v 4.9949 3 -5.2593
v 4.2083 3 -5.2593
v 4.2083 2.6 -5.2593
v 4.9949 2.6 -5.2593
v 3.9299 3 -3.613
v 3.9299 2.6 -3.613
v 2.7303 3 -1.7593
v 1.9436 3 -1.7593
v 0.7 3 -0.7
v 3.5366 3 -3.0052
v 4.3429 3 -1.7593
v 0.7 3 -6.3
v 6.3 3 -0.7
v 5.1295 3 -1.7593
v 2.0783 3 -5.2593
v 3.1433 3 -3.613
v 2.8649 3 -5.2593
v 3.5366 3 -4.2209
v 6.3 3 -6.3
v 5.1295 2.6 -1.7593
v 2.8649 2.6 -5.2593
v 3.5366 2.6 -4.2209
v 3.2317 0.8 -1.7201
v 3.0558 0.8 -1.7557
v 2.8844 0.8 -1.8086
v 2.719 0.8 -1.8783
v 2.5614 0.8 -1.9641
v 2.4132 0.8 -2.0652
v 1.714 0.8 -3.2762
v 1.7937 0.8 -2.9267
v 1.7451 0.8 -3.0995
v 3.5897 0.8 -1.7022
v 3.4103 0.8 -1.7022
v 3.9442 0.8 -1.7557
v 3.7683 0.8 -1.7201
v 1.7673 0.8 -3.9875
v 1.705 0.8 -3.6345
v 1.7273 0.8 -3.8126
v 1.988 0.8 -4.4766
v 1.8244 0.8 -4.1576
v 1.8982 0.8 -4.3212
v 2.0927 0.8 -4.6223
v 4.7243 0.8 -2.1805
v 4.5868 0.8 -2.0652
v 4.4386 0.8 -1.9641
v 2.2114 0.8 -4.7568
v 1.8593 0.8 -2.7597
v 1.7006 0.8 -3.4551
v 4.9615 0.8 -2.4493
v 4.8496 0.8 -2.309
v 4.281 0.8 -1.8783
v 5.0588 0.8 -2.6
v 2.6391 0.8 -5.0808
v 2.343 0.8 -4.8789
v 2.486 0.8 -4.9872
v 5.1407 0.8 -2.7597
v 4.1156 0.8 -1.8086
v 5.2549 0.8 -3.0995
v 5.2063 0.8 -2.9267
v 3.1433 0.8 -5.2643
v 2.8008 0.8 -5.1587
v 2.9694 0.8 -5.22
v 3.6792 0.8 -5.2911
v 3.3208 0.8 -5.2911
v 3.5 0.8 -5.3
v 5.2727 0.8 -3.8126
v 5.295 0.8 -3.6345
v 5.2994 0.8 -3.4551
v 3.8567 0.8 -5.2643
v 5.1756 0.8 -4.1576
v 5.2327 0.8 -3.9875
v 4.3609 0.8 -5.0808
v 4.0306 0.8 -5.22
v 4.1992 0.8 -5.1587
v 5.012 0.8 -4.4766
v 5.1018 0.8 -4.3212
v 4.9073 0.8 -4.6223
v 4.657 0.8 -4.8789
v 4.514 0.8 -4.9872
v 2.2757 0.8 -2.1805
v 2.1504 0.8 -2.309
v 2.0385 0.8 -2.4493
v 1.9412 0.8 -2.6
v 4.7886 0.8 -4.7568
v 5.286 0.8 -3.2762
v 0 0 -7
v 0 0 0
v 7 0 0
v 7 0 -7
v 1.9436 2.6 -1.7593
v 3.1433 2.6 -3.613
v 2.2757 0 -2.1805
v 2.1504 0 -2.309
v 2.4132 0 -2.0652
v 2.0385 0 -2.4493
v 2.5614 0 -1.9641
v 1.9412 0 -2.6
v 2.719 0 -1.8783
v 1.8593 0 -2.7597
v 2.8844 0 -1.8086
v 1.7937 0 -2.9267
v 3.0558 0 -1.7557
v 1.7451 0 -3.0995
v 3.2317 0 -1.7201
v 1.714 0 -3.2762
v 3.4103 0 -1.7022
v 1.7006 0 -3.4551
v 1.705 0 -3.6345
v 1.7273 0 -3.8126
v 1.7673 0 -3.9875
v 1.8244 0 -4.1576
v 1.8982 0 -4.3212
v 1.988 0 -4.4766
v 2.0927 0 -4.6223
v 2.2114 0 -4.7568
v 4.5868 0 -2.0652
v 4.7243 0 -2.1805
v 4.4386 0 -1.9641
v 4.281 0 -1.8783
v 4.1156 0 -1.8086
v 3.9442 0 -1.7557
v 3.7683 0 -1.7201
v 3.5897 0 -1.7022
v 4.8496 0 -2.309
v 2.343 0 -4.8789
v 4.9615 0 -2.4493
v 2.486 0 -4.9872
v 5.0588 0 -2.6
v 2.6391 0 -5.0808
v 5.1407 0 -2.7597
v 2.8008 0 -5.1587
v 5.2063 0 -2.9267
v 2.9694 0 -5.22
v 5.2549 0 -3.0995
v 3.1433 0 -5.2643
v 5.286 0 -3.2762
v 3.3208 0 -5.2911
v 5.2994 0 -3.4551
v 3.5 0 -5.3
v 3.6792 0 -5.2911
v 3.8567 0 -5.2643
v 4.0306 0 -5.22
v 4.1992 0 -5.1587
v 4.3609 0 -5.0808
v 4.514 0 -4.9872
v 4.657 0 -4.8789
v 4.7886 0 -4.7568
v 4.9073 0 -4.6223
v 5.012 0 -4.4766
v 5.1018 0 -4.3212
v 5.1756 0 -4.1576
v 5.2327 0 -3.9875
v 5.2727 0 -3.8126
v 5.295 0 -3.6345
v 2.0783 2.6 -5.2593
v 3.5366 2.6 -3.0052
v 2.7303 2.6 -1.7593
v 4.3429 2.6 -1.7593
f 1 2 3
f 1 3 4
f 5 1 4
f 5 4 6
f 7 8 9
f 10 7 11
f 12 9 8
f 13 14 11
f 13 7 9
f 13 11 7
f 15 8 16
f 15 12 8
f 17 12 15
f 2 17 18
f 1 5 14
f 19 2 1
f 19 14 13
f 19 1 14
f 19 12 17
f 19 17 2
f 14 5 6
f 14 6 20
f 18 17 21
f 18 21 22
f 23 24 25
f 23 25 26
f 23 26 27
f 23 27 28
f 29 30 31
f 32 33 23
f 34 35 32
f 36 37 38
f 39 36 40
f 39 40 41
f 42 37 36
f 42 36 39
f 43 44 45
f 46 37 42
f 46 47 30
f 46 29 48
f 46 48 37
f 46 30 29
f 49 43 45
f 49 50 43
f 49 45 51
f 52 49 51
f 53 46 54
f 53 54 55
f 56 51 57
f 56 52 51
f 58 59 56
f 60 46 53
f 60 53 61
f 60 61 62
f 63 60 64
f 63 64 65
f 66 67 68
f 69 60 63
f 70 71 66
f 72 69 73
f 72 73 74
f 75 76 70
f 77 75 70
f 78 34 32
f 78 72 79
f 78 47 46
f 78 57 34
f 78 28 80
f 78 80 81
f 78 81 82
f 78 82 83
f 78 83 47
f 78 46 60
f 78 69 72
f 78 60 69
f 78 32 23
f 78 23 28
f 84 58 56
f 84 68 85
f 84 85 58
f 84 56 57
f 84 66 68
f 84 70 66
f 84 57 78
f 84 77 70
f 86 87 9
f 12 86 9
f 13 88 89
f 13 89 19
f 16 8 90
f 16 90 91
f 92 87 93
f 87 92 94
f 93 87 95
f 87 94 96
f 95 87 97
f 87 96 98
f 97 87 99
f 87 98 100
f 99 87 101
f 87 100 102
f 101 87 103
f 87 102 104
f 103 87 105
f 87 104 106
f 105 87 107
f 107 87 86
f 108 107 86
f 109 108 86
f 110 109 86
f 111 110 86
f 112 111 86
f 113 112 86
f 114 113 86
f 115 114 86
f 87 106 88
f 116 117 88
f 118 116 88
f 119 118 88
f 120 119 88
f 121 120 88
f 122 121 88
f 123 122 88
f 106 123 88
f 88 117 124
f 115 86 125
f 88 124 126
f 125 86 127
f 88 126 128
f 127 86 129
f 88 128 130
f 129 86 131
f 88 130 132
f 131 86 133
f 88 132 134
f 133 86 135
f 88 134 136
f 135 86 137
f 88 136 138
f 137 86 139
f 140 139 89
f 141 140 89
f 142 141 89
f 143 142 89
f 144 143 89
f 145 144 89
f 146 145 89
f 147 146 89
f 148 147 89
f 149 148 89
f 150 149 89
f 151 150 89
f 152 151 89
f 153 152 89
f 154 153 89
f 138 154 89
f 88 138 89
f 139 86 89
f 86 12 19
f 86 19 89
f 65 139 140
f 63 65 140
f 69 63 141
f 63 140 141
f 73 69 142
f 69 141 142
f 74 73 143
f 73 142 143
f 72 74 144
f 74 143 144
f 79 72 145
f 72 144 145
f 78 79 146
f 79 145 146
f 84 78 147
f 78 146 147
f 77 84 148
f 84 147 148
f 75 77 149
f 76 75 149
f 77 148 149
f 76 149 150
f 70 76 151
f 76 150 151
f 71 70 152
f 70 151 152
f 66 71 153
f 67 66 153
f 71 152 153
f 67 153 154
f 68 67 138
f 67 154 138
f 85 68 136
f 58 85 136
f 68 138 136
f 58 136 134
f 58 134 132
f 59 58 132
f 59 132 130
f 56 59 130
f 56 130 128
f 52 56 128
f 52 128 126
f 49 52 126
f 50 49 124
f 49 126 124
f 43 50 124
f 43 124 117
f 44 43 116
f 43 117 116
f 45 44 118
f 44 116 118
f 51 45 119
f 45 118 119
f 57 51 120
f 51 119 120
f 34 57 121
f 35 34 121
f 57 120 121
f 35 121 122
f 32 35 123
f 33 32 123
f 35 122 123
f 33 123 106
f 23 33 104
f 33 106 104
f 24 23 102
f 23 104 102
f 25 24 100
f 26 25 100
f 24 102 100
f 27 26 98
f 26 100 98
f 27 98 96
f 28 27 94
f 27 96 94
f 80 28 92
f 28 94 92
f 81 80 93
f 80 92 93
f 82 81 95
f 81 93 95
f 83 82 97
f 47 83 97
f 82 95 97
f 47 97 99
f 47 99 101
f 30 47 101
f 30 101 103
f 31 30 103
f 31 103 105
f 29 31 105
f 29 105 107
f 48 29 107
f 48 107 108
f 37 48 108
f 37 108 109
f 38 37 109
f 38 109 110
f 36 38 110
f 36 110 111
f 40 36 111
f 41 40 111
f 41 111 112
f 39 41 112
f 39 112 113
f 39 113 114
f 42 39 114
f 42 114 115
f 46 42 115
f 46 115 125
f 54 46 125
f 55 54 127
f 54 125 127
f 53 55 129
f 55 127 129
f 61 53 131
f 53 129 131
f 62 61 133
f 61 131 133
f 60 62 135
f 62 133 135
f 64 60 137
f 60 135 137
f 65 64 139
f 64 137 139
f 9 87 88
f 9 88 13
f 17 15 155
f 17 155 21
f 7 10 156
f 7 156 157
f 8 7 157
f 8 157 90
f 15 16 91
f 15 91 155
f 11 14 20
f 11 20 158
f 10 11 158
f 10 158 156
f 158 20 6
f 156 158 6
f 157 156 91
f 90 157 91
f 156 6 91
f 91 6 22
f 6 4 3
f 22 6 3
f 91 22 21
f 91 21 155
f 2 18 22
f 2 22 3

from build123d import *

# Parameters (mm, degrees)
SKETCH1_W           = 7
SKETCH1_H           = 7
BOSS_EXTRUDE1_DEPTH = 3
CUT_EXTRUDE1_DEPTH  = 7
CUT_EXTRUDE2_DEPTH  = 11
SKETCH4_R           = 1.8
CUT_EXTRUDE3_DEPTH  = 0.8
CUT_EXTRUDE4_DEPTH  = 0.4


with BuildPart() as part:
    # Sketch1 → Boss-Extrude1 (new body)
    with BuildSketch(Plane(origin=(0, 0, 0), x_dir=(1, 0, 0), z_dir=(0, 1, 0))):
        with Locations((3.5, 3.5)):
            Rectangle(SKETCH1_W, SKETCH1_H)
    extrude(amount=BOSS_EXTRUDE1_DEPTH)

    # Sketch2 → Cut-Extrude1 (cut)
    with BuildSketch(Plane.XY):
        Polygon((0, 0), (0.7, 3), (0, 3), align=None)
        Polygon((7, 0), (6.3, 3), (7, 3), align=None)
    extrude(amount=-CUT_EXTRUDE1_DEPTH, mode=Mode.SUBTRACT)

    # Sketch3 → Cut-Extrude2 (cut)
    with BuildSketch(Plane(origin=(0, 0, 0), x_dir=(0, 0, -1), z_dir=(1, 0, 0))):
        Polygon((0, 0), (0.7, 3), (0, 3), align=None)
        Polygon((7, 3), (6.3, 3), (7, 0), align=None)
    extrude(amount=CUT_EXTRUDE2_DEPTH, mode=Mode.SUBTRACT)

    # Sketch4 → Cut-Extrude3 (cut)
    with BuildSketch(Plane.XZ):
        with Locations(Location((3.5, -3.5, 0), (0, 0, 270))):
            Circle(SKETCH4_R)
    extrude(amount=-CUT_EXTRUDE3_DEPTH, mode=Mode.SUBTRACT)

    # Sketch5 → Cut-Extrude4 (cut)
    with BuildSketch(Plane(origin=(0, 3, 0), x_dir=(1, 0, 0), z_dir=(0, 1, 0))):
        Polygon((1.943645472, 1.759282352), (3.143264863, 3.613048377), (2.078260857, 5.259282352), (2.864919511, 5.259282352), (3.53659419, 4.220920973), (4.20826887, 5.259282352), (4.994927523, 5.259282352), (3.929923517, 3.613048377), (5.129542908, 1.759282352), (4.342884254, 1.759282352), (3.53659419, 3.005175781), (2.730304126, 1.759282352), align=None)
    extrude(amount=-CUT_EXTRUDE4_DEPTH, mode=Mode.SUBTRACT)


solid = part.part
